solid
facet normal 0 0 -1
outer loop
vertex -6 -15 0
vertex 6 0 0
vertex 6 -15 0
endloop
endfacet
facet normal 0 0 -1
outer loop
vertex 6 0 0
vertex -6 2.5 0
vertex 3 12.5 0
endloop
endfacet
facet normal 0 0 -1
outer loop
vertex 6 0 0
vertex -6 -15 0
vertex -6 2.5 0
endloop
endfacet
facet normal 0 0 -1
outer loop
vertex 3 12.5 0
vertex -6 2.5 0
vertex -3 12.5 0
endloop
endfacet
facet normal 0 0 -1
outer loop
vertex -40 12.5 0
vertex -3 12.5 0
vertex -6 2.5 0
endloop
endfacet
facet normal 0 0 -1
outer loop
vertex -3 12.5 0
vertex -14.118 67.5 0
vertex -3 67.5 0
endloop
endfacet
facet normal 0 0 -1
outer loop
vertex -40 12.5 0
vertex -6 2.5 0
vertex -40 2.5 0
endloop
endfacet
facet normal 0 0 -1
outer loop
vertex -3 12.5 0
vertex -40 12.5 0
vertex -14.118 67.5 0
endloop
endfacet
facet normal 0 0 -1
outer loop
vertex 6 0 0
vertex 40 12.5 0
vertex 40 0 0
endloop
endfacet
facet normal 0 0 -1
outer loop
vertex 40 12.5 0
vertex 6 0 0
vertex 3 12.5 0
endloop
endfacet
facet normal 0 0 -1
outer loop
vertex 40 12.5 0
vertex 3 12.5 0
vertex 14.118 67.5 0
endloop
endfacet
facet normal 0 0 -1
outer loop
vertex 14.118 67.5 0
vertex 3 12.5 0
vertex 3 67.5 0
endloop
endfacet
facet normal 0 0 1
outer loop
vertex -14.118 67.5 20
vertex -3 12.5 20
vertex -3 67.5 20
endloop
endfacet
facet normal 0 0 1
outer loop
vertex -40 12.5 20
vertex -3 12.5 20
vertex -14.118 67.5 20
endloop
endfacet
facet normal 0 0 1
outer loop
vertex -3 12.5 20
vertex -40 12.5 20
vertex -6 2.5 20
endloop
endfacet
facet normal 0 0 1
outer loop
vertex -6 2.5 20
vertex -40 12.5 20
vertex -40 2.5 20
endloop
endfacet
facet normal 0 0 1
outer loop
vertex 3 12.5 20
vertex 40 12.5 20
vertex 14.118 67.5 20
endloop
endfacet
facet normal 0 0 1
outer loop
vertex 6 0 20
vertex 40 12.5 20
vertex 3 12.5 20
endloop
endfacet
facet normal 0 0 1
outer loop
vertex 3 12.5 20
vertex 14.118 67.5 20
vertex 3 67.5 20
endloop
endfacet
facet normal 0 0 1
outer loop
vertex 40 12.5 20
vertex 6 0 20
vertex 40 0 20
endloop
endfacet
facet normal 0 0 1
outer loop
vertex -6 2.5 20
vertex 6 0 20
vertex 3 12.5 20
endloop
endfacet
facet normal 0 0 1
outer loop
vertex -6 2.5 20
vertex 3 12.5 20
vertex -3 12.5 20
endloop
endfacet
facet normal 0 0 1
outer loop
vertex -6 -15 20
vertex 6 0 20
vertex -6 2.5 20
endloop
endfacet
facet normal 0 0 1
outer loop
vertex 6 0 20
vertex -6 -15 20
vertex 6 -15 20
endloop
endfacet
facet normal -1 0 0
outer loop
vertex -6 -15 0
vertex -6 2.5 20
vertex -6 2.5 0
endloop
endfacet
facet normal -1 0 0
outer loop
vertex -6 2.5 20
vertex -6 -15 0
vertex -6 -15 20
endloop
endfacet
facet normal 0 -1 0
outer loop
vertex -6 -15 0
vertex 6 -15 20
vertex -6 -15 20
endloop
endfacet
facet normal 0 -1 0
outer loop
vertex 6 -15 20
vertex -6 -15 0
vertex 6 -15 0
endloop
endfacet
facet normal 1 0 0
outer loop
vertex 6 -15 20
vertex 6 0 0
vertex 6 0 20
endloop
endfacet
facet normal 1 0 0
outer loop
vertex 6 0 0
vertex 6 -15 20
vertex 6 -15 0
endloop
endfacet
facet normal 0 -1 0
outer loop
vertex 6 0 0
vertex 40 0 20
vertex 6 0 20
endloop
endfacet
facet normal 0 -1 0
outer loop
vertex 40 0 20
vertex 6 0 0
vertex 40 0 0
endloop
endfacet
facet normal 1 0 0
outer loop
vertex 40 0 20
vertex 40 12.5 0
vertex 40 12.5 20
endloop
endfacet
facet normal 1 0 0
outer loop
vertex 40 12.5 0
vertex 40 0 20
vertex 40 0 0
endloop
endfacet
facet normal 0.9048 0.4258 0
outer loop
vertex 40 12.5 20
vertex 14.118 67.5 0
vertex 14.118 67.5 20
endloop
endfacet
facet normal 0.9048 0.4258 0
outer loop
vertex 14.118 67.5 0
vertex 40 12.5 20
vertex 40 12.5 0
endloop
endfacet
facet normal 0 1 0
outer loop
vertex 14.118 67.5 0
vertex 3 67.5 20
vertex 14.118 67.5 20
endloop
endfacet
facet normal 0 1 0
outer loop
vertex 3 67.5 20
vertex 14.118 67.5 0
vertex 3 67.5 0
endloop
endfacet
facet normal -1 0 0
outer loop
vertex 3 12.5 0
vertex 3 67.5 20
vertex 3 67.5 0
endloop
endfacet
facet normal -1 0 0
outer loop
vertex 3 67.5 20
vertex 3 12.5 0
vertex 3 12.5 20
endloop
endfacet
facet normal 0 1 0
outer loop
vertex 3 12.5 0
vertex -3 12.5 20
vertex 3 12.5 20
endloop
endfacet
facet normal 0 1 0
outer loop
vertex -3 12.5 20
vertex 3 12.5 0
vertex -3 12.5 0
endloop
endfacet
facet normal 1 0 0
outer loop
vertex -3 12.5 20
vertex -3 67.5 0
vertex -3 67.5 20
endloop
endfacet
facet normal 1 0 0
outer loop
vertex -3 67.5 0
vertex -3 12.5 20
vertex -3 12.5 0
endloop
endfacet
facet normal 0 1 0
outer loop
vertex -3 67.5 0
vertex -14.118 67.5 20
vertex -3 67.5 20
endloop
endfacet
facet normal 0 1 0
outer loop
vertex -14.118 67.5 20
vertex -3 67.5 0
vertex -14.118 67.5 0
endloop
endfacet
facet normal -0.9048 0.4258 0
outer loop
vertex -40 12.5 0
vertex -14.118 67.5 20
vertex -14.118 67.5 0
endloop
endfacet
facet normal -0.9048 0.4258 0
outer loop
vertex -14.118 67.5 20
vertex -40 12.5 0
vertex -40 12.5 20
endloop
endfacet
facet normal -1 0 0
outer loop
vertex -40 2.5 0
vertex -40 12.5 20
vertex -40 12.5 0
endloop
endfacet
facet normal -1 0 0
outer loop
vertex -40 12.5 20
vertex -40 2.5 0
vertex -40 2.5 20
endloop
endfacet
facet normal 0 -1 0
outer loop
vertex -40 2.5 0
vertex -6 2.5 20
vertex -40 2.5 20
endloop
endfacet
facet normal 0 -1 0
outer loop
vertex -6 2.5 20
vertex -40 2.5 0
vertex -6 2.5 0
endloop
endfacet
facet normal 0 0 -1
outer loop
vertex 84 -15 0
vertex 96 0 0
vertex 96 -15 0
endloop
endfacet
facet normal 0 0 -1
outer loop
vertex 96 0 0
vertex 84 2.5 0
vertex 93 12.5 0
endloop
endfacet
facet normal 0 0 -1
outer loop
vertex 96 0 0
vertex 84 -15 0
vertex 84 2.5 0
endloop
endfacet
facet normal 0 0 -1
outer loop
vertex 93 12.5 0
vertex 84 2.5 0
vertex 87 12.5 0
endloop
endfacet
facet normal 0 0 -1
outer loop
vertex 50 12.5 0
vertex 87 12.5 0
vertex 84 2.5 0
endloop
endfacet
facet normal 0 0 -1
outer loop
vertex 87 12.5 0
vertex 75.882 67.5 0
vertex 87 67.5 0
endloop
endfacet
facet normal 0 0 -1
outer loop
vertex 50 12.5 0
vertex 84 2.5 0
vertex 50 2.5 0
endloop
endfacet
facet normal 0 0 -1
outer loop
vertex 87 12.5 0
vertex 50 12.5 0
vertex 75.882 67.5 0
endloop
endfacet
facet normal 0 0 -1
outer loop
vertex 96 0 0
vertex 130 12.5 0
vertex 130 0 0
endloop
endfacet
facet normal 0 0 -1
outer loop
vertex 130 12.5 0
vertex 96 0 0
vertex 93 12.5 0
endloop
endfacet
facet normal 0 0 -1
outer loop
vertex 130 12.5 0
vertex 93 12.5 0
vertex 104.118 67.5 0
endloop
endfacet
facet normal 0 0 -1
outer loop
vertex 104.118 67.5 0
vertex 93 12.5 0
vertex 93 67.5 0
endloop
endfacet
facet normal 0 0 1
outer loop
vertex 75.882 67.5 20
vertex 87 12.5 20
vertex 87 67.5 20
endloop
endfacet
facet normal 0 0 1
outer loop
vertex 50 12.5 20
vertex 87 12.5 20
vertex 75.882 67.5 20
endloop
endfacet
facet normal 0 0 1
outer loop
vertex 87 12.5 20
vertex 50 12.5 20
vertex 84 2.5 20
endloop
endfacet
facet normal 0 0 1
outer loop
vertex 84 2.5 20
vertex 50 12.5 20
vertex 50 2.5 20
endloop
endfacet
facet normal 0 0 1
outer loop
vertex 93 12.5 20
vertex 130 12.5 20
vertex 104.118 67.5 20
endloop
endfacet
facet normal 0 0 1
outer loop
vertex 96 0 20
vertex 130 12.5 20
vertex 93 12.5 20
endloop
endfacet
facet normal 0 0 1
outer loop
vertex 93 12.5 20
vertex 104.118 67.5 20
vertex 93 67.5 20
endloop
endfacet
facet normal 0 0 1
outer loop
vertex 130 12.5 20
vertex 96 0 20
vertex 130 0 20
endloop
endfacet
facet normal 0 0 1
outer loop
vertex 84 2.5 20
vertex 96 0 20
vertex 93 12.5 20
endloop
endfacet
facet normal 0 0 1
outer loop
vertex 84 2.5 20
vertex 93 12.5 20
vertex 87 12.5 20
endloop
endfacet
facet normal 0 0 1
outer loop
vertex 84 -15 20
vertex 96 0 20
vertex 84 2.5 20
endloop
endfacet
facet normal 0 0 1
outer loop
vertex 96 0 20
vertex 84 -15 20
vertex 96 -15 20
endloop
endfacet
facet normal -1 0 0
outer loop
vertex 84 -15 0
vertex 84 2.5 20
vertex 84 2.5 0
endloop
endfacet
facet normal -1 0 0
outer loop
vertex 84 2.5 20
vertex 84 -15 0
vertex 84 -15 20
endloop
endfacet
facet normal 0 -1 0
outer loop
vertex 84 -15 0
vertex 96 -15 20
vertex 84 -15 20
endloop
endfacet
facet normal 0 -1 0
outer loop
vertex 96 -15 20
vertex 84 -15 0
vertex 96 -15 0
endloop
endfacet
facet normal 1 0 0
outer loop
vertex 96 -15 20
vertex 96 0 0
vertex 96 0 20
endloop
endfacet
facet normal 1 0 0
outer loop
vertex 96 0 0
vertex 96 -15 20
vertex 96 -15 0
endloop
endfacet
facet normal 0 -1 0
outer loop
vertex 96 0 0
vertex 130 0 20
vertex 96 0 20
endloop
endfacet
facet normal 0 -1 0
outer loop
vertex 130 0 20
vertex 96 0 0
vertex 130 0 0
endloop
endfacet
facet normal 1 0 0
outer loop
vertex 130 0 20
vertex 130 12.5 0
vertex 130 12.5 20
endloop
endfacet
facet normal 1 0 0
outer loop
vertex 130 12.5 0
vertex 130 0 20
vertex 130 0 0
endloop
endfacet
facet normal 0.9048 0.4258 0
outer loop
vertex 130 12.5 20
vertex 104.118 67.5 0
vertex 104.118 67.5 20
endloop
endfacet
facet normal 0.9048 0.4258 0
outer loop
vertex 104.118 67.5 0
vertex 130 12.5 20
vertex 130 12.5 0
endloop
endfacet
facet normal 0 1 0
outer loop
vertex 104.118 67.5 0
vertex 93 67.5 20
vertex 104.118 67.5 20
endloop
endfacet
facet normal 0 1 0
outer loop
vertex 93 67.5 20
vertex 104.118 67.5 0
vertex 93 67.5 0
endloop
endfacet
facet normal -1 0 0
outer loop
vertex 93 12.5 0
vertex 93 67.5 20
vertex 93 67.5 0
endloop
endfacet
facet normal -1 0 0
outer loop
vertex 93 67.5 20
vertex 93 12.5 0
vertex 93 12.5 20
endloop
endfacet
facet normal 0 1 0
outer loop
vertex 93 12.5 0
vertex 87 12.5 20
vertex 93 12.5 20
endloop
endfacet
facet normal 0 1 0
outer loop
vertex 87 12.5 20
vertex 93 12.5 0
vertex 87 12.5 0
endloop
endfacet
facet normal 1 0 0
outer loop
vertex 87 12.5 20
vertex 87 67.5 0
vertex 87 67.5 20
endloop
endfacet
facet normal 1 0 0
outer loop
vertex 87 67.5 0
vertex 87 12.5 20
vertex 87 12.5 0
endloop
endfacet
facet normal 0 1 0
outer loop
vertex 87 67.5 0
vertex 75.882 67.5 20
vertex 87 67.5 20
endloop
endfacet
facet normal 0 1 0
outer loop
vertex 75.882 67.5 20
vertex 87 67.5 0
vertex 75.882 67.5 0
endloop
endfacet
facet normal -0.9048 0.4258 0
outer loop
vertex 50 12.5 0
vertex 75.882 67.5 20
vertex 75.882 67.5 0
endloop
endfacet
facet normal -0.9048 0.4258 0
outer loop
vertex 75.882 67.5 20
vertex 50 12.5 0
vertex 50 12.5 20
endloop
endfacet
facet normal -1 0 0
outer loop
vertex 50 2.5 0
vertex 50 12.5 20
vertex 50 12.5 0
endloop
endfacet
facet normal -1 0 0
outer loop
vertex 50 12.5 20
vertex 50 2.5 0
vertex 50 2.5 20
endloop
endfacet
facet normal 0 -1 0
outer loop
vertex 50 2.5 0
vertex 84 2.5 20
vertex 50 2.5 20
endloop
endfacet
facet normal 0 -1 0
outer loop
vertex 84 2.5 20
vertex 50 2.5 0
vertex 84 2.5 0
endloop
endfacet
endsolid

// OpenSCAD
TABLE_SEP = 12;
TABLE_ASYM = 2.5;
INSERT_AMOUNT = 15;
BOARD_THICK = 5;
GAP_SIZE = BOARD_THICK + 1;
BASE_WIDTH = 80;
SUPPORT_HEIGHT = 55;
TRIANGLE_CUT = 30;
BASE_HEIGHT = 10;
THICKNESS = 20;


module mirror_copy(axis) {
    children()
        ;
    mirror(axis)
    children()
        ;
}


for (xoffs=[0, BASE_WIDTH + 10])
translate([xoffs, 0, 0])
linear_extrude(THICKNESS) {
    translate([-TABLE_SEP / 2, -INSERT_AMOUNT])
    square([TABLE_SEP, INSERT_AMOUNT])
        ;
    translate([-TABLE_SEP / 2, 0])
    square([BASE_WIDTH / 2 + TABLE_SEP / 2, TABLE_ASYM + 0.01])
        ;
    translate([-BASE_WIDTH / 2, TABLE_ASYM])
    square([BASE_WIDTH, BASE_HEIGHT])
        ;
    translate([0, BASE_HEIGHT + TABLE_ASYM])
    difference() {
        mirror_copy()
        polygon([
            [-BASE_WIDTH / 2, 0],
            [0, SUPPORT_HEIGHT + TRIANGLE_CUT],
            [0, 0]
        ])
            ;
        translate([-GAP_SIZE / 2, 0])
        square([GAP_SIZE, SUPPORT_HEIGHT + TRIANGLE_CUT])
            ;
        translate([-BASE_WIDTH / 2, SUPPORT_HEIGHT])
        square([BASE_WIDTH, 50])
            ;
    }
        ;
        
}
    ;
